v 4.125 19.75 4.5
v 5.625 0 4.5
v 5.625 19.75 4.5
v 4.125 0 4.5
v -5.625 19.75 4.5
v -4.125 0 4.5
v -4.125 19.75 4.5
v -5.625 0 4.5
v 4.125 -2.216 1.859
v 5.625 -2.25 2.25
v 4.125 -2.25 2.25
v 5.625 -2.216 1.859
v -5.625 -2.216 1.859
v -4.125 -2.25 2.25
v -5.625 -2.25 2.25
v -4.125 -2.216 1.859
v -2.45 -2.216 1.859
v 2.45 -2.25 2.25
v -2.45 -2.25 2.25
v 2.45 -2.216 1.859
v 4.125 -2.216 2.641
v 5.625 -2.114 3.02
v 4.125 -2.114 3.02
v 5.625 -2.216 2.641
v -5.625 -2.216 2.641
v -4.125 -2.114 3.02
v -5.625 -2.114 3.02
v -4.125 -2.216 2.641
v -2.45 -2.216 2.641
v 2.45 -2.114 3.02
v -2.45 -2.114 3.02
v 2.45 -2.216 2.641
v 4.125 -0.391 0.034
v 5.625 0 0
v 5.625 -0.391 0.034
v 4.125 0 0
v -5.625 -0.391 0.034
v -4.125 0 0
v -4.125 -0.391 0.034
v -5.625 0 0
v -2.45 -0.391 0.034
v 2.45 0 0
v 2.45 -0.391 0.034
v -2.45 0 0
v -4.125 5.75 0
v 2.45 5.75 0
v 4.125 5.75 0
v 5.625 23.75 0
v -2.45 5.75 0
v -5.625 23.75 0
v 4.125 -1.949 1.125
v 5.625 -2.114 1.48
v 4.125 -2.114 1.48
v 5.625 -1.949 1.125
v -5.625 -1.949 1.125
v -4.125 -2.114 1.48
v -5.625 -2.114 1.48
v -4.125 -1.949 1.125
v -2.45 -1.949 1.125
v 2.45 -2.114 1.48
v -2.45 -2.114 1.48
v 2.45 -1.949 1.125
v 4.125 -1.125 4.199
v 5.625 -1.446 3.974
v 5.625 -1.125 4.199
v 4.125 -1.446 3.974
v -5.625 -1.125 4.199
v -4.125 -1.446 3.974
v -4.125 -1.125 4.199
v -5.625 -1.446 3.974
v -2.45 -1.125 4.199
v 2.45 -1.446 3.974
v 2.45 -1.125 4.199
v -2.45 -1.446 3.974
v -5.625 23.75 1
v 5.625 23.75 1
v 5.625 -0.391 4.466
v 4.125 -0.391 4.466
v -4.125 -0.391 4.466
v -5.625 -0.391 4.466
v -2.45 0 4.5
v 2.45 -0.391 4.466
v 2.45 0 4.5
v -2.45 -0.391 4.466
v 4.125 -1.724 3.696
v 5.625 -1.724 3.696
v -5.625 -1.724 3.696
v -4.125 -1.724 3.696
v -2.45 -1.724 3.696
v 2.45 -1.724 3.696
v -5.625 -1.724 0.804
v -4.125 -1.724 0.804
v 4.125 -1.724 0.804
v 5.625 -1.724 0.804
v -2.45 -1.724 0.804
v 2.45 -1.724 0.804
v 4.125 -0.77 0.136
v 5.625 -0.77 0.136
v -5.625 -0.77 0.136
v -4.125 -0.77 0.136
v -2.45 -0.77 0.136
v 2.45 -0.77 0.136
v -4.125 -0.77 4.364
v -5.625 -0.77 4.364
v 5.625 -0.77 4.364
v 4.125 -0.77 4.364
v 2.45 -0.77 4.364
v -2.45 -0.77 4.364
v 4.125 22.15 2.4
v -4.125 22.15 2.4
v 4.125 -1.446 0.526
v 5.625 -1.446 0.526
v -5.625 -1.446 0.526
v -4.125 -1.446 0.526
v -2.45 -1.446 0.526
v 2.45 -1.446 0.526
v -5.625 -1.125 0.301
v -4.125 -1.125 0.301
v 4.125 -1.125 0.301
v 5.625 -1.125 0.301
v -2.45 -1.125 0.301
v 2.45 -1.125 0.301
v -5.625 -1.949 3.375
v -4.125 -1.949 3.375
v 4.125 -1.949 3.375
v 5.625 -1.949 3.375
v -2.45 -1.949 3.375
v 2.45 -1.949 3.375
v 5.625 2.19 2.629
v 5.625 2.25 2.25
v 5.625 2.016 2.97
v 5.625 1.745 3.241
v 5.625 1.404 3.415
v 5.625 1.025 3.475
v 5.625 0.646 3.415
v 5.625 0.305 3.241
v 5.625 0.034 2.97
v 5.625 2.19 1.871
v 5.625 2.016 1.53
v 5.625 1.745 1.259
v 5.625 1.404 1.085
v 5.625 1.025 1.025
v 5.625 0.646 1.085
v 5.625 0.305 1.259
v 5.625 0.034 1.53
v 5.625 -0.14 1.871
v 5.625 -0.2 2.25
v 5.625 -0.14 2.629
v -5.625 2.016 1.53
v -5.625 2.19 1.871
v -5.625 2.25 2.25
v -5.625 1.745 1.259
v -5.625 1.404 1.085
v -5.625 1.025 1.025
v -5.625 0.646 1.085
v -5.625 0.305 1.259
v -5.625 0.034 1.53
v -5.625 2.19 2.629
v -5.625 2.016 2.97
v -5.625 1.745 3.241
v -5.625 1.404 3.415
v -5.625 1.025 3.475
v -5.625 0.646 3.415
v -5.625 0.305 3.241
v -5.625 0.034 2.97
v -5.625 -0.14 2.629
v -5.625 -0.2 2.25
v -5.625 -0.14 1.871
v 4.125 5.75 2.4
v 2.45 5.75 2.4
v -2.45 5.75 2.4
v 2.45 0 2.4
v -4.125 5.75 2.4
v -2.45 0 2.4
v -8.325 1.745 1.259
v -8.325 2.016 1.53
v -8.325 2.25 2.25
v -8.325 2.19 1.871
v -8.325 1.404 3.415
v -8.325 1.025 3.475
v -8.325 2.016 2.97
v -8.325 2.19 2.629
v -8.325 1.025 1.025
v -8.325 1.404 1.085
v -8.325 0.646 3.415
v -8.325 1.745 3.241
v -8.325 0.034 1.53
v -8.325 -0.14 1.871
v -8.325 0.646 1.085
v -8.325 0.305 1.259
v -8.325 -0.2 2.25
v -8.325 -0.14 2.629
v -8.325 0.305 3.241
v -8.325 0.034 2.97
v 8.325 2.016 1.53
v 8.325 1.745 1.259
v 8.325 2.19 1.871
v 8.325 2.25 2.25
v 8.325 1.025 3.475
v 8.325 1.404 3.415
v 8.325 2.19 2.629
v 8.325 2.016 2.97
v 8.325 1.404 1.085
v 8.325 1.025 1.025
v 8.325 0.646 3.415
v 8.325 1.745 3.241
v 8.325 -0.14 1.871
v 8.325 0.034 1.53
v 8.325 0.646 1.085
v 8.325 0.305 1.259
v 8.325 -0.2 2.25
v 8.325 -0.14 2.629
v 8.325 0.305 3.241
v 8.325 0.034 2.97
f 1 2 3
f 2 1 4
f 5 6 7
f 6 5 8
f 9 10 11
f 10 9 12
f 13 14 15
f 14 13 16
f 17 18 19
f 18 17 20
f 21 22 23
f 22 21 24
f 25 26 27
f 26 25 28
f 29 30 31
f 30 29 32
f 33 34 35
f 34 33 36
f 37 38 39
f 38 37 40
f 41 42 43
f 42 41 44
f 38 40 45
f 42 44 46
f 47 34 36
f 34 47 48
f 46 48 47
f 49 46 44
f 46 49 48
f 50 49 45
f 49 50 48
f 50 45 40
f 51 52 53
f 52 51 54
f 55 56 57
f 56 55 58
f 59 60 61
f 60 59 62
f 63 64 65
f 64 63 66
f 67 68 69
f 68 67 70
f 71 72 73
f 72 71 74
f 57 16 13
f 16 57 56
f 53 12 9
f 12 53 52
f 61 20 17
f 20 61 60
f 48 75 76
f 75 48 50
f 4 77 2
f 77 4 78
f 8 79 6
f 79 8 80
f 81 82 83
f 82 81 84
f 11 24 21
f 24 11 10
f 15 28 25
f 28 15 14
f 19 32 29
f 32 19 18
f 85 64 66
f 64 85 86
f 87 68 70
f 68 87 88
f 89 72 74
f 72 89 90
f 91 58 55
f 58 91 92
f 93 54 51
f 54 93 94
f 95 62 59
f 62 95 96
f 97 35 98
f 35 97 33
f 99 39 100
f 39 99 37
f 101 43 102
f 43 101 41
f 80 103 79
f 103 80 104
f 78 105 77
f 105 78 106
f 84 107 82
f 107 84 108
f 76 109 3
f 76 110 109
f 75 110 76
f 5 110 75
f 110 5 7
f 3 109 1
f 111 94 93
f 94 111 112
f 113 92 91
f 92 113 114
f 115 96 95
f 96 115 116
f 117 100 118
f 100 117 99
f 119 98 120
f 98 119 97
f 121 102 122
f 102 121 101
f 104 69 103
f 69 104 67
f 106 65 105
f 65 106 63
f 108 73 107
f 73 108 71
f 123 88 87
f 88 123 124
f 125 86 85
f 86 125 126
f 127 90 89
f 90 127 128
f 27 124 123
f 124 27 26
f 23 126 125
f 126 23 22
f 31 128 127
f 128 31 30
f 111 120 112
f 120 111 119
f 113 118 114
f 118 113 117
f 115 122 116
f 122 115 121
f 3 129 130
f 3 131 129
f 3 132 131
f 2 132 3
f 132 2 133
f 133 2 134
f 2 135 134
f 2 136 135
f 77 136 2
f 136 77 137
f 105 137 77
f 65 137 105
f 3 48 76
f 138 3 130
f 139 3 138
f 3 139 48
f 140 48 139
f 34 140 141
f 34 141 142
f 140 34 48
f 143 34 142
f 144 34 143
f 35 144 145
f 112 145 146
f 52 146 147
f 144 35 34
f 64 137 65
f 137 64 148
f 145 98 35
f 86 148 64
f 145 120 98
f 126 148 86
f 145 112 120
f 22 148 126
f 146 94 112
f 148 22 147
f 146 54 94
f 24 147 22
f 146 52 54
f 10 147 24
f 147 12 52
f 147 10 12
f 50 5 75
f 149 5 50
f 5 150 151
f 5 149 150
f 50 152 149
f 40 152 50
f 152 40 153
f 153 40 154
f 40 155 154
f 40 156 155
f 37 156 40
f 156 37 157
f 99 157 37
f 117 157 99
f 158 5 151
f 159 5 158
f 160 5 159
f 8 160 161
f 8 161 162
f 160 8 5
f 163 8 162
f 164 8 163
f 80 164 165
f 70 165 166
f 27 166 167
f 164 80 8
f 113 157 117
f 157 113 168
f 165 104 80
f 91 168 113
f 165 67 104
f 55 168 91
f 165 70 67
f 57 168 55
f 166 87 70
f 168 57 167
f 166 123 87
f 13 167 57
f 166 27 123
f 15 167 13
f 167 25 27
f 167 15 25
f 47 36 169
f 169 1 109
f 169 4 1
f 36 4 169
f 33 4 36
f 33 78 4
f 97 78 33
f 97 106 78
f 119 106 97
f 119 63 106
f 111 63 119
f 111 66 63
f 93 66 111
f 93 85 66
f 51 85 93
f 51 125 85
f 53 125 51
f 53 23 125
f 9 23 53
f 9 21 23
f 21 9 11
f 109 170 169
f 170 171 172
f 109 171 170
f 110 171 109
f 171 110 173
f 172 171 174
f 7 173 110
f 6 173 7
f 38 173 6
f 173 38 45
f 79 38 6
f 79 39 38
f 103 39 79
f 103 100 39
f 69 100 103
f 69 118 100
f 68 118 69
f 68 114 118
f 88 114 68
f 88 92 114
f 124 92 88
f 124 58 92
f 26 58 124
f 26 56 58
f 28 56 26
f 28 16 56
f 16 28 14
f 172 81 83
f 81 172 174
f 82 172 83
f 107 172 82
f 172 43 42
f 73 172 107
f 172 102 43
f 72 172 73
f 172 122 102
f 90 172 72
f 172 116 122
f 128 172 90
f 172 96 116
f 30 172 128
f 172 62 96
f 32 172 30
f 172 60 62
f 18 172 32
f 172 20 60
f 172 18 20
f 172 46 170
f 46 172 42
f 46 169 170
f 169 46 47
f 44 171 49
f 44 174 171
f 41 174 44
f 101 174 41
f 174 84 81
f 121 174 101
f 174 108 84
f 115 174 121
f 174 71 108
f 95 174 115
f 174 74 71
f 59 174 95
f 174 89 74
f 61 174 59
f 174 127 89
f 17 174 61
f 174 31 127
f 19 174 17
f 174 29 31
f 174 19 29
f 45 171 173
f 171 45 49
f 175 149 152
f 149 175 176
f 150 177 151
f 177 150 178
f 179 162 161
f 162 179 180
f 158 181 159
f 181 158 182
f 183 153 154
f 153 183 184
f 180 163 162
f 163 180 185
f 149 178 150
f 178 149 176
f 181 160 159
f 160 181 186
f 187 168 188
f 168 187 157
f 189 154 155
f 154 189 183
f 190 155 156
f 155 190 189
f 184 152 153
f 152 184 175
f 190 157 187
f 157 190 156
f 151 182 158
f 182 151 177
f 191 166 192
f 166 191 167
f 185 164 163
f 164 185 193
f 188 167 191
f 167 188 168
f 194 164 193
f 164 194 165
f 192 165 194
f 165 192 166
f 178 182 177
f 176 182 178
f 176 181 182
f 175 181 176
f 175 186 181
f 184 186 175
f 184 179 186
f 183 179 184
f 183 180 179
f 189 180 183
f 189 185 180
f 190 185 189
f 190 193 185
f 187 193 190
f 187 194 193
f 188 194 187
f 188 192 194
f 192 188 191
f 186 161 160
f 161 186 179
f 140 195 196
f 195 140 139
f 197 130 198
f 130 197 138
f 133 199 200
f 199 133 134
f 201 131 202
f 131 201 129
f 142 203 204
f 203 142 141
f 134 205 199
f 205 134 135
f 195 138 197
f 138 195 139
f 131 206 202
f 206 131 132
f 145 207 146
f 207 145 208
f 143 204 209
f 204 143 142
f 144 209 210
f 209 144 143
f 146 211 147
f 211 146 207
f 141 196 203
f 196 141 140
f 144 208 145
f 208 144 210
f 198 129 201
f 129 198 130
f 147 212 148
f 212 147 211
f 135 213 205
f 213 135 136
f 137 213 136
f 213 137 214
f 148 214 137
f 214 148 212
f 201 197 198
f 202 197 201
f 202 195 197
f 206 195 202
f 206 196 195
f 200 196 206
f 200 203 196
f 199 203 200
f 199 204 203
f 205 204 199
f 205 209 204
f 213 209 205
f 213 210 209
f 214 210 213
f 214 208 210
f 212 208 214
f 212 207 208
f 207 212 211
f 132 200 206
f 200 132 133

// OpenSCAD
$fa=1;
$fs=0.4;

module base(width, length, height, overall_length)
{
    translate([0,0, height/2])
    hull()
    {
        rotate(90, [0,1,0])
            cylinder(r=height/2, width, center=true);
        translate([0,length-height/2-0.5,0])
            cube([width, 1, height], center=true);
        translate([0,overall_length-height/2-0.5,-height/2+0.5])
            cube([width, 1, 1], center=true);
    }
}

module base_cutout(width, length, height, overall_length,
    thickness, base_thickness,
    slot_width, slot_length, latch_width)
{
    difference()
    {
        // generate base block
        base(base_width, base_length, base_height, overall_length);
        // remove center
        cutout_width = width - 2*thickness;
        cutout_length = overall_length - thickness;
        cutout_height = 2*height;
        translate([0,cutout_length/2,height+base_thickness])
            cube([cutout_width, cutout_length, cutout_height], center=true);
        // remove slots
        translate([latch_width/2+slot_width/2,slot_length/2-height/2,height-0.1])
            cube([slot_width, slot_length, 2*height], center=true);
        translate([-latch_width/2-slot_width/2,slot_length/2-height/2,height-0.1])
            cube([slot_width, slot_length, 2*height], center=true);

    }

}

module mount_nubs(nub_radius, nub_length, height, nub_offset, base_width)
{
    translate([-base_width/2-nub_length/2,(height/2-nub_radius), height/2])
        rotate(90, [0,1,0])
            cylinder(r=nub_radius, nub_length, center=true);
    translate([base_width/2+nub_length/2,(height/2-nub_radius), height/2])
        rotate(90, [0,1,0])
            cylinder(r=nub_radius, nub_length, center=true);
}

base_width      = 11.25;
base_height     = 4.5;
overall_length  = 26;
base_length     = overall_length-4;
wall_thickness  = 1.5;
base_thickness  = 2.4;
latch_width     = 4.9;
slot_width      = (base_width-(2*wall_thickness+latch_width))/2; //1.325;
slot_length     = 8;
nub_radius      = 2.45/2;
nub_length      = 2.7;
nub_offset      = 2.6; // distance from rounded edge

base_cutout(base_width, base_length, base_height,
    overall_length, wall_thickness, base_thickness,
    slot_width, slot_length, latch_width);

mount_nubs(nub_radius, nub_length, base_height, nub_offset, base_width);
